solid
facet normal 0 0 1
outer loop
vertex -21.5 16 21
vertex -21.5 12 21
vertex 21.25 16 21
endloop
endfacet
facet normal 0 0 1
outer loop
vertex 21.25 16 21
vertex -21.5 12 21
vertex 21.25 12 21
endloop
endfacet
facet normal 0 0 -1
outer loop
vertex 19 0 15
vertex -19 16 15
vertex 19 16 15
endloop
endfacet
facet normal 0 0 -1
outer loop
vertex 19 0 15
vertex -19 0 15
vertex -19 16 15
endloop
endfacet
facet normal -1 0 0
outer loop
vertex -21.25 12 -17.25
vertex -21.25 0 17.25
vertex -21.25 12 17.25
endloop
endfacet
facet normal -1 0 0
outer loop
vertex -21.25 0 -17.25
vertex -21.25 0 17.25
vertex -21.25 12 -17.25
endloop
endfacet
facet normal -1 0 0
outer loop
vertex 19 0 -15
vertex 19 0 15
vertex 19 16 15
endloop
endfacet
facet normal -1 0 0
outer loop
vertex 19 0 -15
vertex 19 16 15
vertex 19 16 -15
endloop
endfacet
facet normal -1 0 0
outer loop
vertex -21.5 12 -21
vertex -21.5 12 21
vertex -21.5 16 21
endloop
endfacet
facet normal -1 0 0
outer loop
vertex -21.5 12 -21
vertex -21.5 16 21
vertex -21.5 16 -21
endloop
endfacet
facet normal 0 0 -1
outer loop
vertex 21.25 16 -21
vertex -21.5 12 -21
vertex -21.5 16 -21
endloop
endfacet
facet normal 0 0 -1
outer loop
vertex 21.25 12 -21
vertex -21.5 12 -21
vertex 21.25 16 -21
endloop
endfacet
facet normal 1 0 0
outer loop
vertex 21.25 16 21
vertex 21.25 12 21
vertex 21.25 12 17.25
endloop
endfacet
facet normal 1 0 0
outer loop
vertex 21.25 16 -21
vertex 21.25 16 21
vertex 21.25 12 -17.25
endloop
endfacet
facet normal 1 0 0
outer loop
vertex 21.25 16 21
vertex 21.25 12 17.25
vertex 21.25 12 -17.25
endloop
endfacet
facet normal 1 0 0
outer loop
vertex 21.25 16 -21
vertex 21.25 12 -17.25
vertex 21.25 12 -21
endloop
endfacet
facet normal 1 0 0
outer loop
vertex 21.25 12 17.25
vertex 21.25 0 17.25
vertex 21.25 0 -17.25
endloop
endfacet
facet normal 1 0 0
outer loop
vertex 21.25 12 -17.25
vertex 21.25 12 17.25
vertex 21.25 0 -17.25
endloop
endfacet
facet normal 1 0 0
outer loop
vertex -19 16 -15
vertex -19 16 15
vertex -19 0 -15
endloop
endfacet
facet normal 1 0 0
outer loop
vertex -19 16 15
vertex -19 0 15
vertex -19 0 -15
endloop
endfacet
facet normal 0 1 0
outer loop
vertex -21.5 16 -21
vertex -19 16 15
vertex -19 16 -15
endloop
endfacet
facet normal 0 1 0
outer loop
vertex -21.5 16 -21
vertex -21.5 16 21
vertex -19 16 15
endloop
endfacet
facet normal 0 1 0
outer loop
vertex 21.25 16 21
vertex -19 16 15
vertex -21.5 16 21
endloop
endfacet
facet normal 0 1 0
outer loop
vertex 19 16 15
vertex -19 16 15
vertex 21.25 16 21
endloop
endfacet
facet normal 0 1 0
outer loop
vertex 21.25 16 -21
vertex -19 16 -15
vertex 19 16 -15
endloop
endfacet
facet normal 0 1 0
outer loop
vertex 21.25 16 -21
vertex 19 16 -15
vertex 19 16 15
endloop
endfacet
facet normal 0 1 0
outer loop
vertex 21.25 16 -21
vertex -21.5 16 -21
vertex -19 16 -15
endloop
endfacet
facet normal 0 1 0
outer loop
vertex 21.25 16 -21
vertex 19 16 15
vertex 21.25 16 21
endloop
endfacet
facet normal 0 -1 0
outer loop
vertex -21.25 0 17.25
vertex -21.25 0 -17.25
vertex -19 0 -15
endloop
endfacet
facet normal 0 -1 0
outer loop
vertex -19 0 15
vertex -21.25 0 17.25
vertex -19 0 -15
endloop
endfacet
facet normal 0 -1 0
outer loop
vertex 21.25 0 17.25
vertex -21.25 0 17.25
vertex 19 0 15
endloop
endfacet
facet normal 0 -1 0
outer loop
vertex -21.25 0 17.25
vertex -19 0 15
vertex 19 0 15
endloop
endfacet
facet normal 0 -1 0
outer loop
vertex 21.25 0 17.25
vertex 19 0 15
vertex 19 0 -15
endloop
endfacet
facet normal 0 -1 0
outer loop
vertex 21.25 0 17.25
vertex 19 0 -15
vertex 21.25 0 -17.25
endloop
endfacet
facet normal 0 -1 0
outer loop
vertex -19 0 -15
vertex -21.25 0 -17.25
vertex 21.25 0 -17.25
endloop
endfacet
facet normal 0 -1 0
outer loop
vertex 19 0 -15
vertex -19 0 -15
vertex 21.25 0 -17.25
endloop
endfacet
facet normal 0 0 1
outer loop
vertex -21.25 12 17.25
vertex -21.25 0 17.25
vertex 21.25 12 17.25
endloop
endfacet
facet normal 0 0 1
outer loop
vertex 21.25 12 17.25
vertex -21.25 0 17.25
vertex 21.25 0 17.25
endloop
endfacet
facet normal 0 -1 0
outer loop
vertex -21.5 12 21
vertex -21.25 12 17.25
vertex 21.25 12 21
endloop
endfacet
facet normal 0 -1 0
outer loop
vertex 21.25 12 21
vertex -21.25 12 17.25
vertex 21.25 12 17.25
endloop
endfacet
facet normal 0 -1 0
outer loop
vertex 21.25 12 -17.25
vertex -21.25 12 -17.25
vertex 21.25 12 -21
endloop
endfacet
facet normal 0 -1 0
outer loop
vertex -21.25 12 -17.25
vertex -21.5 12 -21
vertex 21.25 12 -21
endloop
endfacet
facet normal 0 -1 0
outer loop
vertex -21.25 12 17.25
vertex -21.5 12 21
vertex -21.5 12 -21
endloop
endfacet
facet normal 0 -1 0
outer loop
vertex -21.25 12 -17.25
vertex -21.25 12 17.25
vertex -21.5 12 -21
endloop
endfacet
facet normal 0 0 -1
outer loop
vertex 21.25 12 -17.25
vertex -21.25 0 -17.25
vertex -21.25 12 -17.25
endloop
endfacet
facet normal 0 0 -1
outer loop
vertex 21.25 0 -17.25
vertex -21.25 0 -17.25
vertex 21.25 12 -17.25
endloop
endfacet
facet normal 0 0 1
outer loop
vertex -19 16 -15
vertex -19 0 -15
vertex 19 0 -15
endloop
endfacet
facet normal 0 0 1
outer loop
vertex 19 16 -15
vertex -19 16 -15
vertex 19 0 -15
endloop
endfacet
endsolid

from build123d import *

# Parameters (mm, degrees)
SKETCH_1_W      = 42.5
SKETCH_1_H      = 34.5
SKETCH_1_W_2    = 38
SKETCH_1_H_2    = 30
EXTRUDE_1_DEPTH = 12
SKETCH_2_W      = 42.75
SKETCH_2_H      = 42
SKETCH_2_W_2    = 38
SKETCH_2_H_2    = 30
EXTRUDE_2_DEPTH = 4


with BuildPart() as part:
    # Эскиз1 → Бобышка-Вытянуть1 (new body)
    with BuildSketch(Plane(origin=(0, 0, 0), x_dir=(1, 0, 0), z_dir=(0, 1, 0))):
        Rectangle(SKETCH_1_W, SKETCH_1_H)
        Rectangle(SKETCH_1_W_2, SKETCH_1_H_2, mode=Mode.SUBTRACT)
    extrude(amount=EXTRUDE_1_DEPTH)

    # Эскиз2 → Бобышка-Вытянуть2 (add)
    with BuildSketch(Plane(origin=(0, 12, 0), x_dir=(1, 0, 0), z_dir=(0, 1, 0))):
        with Locations((-0.125, 0)):
            Rectangle(SKETCH_2_W, SKETCH_2_H)
        Rectangle(SKETCH_2_W_2, SKETCH_2_H_2, mode=Mode.SUBTRACT)
    extrude(amount=EXTRUDE_2_DEPTH)


solid = part.part
